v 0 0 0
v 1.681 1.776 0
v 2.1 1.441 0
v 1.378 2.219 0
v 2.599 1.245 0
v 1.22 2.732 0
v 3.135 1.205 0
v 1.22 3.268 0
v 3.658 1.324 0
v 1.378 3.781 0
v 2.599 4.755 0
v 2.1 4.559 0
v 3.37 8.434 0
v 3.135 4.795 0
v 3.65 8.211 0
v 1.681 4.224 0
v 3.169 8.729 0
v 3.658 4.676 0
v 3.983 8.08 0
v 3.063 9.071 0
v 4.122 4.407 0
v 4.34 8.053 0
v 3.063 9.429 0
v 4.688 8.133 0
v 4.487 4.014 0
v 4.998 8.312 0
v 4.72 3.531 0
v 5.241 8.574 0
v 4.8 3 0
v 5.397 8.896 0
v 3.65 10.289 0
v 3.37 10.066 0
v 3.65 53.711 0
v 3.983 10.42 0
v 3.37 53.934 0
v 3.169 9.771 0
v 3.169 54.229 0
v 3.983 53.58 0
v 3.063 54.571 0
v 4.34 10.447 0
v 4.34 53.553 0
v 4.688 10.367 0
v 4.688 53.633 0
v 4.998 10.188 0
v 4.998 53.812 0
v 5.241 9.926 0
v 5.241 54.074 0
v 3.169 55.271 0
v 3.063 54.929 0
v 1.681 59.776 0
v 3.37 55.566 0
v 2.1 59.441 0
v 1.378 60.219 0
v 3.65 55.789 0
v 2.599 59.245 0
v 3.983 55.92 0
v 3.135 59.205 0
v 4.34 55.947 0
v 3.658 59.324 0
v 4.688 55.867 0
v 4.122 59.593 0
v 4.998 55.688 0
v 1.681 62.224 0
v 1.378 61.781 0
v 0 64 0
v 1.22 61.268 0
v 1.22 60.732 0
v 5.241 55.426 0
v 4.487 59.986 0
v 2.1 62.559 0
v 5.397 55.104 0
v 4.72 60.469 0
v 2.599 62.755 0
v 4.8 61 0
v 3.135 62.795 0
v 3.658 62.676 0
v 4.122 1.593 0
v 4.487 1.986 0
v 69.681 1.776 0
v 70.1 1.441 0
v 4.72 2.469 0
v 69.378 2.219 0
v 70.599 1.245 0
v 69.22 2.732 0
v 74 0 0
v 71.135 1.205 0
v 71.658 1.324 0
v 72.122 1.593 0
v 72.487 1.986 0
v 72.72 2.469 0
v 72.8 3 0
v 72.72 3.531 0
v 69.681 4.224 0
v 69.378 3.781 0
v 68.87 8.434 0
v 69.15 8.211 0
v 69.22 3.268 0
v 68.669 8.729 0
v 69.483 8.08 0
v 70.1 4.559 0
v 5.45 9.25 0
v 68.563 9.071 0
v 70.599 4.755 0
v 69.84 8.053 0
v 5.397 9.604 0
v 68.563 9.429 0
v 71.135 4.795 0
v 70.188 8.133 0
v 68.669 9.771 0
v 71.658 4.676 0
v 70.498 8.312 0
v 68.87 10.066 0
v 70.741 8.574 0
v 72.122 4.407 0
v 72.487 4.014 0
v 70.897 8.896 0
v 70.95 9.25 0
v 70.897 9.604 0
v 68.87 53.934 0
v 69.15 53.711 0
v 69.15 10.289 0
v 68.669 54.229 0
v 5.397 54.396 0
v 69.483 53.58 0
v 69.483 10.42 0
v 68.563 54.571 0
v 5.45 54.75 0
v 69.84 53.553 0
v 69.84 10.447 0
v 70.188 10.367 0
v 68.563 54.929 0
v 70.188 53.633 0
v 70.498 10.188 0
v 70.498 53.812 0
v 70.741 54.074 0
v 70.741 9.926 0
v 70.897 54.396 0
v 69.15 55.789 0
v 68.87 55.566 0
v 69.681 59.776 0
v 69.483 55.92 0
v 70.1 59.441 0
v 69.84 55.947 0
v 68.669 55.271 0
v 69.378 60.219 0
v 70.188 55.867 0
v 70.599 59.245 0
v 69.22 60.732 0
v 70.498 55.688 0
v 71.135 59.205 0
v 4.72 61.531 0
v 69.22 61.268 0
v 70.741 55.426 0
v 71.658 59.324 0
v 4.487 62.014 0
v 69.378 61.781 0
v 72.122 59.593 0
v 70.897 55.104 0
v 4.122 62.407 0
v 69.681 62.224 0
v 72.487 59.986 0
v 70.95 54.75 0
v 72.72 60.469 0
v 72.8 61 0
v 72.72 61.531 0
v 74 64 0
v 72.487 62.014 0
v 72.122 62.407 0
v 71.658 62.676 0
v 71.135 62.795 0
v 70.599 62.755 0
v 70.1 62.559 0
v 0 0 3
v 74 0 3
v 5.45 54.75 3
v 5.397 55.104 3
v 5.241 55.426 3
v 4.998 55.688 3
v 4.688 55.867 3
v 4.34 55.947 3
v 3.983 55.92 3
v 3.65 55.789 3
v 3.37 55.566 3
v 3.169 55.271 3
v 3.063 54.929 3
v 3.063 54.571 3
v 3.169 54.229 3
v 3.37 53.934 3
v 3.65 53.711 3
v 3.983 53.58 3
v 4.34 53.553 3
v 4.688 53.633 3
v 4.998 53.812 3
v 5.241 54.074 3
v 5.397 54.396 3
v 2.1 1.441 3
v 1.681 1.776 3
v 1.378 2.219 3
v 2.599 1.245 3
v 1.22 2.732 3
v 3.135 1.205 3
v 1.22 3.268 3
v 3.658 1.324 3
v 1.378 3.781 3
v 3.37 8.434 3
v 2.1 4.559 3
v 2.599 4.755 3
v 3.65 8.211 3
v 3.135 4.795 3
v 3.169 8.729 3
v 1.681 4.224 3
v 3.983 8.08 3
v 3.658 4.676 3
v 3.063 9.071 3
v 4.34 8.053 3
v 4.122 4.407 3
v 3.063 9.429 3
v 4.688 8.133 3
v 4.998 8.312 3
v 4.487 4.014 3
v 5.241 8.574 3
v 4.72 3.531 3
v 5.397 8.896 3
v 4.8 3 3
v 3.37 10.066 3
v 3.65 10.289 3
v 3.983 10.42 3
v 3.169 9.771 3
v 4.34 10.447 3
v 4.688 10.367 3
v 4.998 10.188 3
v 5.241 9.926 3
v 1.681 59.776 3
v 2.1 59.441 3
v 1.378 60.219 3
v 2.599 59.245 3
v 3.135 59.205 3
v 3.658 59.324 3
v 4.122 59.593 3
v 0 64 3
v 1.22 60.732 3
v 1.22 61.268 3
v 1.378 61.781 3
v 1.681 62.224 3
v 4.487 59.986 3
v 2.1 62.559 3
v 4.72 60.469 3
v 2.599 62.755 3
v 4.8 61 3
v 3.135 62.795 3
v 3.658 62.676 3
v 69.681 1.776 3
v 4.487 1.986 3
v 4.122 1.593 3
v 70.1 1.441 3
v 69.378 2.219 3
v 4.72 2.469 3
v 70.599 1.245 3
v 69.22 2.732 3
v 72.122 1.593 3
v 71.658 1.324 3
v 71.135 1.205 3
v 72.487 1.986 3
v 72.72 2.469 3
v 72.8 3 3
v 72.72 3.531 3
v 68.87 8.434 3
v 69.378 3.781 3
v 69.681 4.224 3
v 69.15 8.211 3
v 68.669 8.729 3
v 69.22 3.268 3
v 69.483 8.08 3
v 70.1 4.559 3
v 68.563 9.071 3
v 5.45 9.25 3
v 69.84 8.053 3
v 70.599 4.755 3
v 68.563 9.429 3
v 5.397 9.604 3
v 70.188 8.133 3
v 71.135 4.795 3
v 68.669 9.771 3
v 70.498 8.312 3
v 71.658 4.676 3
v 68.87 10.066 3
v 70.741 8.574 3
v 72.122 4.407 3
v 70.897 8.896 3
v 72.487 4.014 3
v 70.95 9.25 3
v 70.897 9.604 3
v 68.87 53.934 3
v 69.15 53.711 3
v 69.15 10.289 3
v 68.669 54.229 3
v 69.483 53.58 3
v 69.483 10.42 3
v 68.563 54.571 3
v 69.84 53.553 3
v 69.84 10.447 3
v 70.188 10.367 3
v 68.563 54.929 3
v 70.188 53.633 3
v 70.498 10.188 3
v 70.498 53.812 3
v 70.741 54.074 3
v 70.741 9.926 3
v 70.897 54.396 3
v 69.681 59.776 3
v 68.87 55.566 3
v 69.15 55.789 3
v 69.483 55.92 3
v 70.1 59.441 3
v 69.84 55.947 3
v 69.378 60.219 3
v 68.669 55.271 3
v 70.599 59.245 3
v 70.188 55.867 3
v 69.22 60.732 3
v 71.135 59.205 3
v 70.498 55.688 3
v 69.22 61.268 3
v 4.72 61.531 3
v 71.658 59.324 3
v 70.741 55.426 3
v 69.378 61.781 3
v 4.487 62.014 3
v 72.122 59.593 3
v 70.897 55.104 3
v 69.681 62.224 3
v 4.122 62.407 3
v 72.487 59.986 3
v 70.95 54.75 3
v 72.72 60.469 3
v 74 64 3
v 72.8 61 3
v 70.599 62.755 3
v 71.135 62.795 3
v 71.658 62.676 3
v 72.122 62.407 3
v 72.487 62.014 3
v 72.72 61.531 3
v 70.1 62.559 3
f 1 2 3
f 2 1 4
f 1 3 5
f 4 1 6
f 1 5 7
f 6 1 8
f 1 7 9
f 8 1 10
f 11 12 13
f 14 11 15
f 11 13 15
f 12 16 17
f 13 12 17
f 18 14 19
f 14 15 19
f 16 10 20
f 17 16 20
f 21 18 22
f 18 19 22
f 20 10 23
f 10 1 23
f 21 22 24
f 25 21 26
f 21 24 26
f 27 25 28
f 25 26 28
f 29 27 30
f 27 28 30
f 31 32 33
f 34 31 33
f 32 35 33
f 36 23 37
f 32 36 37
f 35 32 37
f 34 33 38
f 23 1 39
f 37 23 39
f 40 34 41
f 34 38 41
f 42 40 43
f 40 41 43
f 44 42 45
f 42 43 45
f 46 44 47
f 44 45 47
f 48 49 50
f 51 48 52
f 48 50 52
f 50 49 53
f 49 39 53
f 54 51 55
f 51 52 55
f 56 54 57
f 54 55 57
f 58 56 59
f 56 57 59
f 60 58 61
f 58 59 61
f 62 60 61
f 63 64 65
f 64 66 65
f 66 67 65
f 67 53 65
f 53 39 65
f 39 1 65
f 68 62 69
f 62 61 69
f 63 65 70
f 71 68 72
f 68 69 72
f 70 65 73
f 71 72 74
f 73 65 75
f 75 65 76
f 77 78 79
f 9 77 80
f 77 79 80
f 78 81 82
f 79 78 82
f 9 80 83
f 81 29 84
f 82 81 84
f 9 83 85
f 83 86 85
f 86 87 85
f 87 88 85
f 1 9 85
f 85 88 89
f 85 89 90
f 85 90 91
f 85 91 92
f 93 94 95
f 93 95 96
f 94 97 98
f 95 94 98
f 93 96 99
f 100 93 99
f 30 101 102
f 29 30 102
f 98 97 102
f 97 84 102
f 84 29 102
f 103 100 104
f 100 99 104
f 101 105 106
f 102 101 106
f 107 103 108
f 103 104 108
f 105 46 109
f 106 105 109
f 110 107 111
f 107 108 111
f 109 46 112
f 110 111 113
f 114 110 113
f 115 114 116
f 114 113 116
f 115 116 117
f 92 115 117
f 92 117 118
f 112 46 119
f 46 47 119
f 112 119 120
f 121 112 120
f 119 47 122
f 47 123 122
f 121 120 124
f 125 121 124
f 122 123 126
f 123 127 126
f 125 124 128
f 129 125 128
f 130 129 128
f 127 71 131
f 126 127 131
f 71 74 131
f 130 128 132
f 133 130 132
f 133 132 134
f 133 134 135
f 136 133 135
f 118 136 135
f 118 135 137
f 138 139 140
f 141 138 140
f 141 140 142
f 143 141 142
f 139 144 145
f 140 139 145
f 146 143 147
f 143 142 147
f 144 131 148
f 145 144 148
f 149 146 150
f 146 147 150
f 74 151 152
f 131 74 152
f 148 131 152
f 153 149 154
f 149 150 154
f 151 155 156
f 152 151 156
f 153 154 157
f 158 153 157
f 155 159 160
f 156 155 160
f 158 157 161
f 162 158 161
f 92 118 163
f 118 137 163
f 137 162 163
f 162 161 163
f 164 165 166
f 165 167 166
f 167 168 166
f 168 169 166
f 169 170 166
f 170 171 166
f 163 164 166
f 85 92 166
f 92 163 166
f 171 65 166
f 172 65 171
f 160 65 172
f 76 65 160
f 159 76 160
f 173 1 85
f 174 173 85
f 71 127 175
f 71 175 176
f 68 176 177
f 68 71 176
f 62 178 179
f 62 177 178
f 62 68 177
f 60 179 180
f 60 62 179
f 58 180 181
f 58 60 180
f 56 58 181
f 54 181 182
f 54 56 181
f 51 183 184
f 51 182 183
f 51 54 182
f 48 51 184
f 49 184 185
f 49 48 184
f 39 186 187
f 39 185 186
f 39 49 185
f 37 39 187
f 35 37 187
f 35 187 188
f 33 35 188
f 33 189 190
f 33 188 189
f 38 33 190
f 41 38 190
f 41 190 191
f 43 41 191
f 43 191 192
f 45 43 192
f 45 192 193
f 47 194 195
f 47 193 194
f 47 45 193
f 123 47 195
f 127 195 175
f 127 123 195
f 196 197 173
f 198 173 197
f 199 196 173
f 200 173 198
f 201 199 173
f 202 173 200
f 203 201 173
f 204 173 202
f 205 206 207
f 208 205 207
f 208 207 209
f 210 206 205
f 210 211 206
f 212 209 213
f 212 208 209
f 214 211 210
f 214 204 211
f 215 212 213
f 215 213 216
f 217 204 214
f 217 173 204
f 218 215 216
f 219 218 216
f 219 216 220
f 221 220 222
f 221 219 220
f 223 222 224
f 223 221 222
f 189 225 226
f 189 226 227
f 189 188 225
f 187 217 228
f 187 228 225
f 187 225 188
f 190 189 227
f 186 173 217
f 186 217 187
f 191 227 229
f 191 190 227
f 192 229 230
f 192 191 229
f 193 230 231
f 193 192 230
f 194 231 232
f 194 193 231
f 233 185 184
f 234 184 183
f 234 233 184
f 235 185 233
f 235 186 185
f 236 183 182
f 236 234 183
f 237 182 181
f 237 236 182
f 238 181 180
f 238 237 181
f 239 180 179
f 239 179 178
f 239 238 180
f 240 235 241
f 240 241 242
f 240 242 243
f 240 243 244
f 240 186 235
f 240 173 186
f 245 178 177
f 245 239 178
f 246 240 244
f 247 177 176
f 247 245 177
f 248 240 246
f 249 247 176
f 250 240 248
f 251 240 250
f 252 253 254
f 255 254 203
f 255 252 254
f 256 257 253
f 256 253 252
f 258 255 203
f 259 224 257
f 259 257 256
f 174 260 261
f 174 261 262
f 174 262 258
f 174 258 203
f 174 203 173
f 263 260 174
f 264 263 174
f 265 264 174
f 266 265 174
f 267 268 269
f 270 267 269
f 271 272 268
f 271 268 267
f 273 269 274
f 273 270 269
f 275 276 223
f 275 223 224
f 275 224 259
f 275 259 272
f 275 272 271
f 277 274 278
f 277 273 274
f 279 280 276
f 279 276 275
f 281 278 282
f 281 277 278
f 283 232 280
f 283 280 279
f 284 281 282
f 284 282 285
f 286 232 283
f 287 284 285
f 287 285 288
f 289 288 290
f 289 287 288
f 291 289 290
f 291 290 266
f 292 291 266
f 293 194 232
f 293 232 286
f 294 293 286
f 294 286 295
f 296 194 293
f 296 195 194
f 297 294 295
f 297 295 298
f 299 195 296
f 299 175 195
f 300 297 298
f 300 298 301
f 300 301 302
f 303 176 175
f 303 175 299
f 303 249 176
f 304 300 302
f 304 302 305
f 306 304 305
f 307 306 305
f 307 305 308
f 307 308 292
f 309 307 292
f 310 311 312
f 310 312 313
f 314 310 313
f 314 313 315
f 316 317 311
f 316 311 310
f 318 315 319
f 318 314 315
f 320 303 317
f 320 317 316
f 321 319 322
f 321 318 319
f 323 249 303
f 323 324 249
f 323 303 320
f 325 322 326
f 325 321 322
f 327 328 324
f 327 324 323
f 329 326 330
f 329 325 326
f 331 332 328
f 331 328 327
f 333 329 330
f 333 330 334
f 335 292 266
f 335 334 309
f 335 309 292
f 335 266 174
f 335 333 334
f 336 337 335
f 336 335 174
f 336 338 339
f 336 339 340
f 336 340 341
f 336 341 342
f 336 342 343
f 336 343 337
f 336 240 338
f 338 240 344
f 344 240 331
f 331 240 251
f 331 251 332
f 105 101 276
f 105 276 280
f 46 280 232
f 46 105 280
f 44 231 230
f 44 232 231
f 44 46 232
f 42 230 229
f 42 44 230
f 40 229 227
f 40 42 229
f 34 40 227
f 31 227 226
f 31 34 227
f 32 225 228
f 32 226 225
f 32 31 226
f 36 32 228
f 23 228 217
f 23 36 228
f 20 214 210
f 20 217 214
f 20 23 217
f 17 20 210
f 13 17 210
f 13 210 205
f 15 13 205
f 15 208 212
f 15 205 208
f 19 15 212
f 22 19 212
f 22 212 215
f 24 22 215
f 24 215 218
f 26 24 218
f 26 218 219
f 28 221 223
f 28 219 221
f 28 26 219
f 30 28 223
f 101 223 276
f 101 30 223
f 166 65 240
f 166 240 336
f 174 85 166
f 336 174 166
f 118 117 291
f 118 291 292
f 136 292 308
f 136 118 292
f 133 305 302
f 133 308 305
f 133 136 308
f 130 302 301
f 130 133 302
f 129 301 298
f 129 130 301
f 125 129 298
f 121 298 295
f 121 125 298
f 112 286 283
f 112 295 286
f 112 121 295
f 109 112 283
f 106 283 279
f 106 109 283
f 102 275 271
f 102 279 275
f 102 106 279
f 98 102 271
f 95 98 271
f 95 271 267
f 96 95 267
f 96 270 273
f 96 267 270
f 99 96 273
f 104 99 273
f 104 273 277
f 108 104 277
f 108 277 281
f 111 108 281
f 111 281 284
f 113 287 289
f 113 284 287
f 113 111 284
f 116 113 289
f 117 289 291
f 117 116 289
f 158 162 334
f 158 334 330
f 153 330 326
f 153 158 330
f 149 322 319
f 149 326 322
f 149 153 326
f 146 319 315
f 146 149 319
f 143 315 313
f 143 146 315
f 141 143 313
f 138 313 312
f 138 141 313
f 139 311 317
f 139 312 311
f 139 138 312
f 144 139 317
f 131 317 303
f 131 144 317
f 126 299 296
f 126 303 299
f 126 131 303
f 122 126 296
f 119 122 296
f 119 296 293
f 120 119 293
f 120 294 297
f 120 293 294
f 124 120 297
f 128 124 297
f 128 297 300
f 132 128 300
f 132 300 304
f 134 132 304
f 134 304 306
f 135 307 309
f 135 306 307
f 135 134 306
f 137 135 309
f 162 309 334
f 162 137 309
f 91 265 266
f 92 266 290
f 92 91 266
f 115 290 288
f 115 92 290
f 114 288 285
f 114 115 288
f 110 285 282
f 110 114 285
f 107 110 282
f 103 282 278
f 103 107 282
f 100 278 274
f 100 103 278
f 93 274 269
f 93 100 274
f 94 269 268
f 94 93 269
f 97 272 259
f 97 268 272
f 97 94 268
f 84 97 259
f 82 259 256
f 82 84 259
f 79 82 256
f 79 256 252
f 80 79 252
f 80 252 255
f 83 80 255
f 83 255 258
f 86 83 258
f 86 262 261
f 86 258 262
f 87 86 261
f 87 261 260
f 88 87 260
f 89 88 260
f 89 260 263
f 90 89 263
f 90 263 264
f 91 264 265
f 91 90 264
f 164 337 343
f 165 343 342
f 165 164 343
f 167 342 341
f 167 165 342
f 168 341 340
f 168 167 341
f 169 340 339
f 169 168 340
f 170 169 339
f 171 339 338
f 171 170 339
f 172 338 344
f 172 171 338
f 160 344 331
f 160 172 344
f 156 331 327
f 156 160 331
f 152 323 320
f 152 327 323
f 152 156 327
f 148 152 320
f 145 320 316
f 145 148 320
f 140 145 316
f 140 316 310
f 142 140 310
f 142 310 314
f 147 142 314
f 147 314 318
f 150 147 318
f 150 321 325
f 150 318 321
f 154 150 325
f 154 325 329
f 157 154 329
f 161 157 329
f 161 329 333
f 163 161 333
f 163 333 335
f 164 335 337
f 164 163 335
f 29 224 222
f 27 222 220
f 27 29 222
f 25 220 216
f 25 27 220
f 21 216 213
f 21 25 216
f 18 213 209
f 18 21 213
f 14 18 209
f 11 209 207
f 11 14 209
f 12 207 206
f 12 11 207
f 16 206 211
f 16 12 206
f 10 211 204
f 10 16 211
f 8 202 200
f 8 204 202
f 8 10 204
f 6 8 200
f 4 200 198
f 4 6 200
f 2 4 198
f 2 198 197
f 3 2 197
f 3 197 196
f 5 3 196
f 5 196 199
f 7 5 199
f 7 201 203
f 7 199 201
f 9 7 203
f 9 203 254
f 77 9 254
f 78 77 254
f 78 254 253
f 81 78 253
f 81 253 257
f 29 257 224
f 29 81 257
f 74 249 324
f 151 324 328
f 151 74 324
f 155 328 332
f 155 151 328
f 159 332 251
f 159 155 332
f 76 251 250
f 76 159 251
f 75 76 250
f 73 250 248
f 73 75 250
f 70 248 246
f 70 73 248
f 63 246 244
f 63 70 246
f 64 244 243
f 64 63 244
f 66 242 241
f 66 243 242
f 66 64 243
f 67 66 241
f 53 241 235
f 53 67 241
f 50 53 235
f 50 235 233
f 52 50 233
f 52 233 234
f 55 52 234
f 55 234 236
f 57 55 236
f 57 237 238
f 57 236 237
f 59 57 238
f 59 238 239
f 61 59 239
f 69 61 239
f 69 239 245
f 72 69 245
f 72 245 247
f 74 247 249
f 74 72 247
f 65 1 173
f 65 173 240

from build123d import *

# Parameters (mm, degrees)
CYLINDER009_R     = 1.8
CYLINDER009_DEPTH = 20
ARRAY005_X_COUNT  = 2
ARRAY005_X_PITCH  = 68
ARRAY005_Y_COUNT  = 2
ARRAY005_Y_PITCH  = 58
CYLINDER005_R     = 1.2
CYLINDER005_DEPTH = 10
ARRAY003_X_COUNT  = 2
ARRAY003_X_PITCH  = 65.5
ARRAY003_Y_COUNT  = 2
ARRAY003_Y_PITCH  = 45.5
BOX006_W          = 74
BOX006_H          = 64
BOX006_DEPTH      = 3


with BuildPart() as wall_box_hole_stand_array001:
    # Cylinder009 → Cylinder009 (new body)
    with BuildSketch(Plane(origin=(3, 3, 0), x_dir=(1, 0, 0), z_dir=(0, 0, 1))):
        Circle(CYLINDER009_R)
    extrude(amount=CYLINDER009_DEPTH)

    # Array005 X: wall box hole stand array001 ×2


with BuildPart() as wall_box_hole_stand_array001_1:
    add(wall_box_hole_stand_array001.part)
    with Locations(*[(i * ARRAY005_X_PITCH, 0, 0) for i in range(1, ARRAY005_X_COUNT)]):
        add(wall_box_hole_stand_array001.part)

    # Array005 Y: wall box hole stand array001 ×2


with BuildPart() as wall_box_hole_stand_array001_2:
    add(wall_box_hole_stand_array001_1.part)
    with Locations(*[(0, i * ARRAY005_Y_PITCH, 0) for i in range(1, ARRAY005_Y_COUNT)]):
        add(wall_box_hole_stand_array001_1.part)


with BuildPart() as bottom_plate_hole_fusion:
    # Cylinder005 → Cylinder005 (new body)
    with BuildSketch(Plane.XY):
        Circle(CYLINDER005_R)
    extrude(amount=CYLINDER005_DEPTH)

    # Array003 X: bottom plate hole fusion ×2


with BuildPart() as bottom_plate_hole_fusion_1:
    add(bottom_plate_hole_fusion.part)
    with Locations(*[(i * ARRAY003_X_PITCH, 0, 0) for i in range(1, ARRAY003_X_COUNT)]):
        add(bottom_plate_hole_fusion.part)

    # Array003 Y: bottom plate hole fusion ×2


with BuildPart() as bottom_plate_hole_fusion_2:
    add(bottom_plate_hole_fusion_1.part)
    with Locations(*[(0, i * ARRAY003_Y_PITCH, 0) for i in range(1, ARRAY003_Y_COUNT)]):
        add(bottom_plate_hole_fusion_1.part)


with BuildPart() as bottom_plate_hole_fusion_3:
    # Array003 placement: moved
    add(bottom_plate_hole_fusion_2.part.moved(Location((4.25, 9.25, -3))))

    # Fusion004: union wall box hole stand array001
    add(wall_box_hole_stand_array001_2.part)


with BuildPart() as bottom_plate_cut:
    # Box006 → Box006 (new body)
    with BuildSketch(Plane.XY):
        with Locations((37, 32)):
            Rectangle(BOX006_W, BOX006_H)
    extrude(amount=BOX006_DEPTH)

    # Cut003: cut bottom plate hole fusion
    add(bottom_plate_hole_fusion_3.part, mode=Mode.SUBTRACT)


solid = bottom_plate_cut.part
